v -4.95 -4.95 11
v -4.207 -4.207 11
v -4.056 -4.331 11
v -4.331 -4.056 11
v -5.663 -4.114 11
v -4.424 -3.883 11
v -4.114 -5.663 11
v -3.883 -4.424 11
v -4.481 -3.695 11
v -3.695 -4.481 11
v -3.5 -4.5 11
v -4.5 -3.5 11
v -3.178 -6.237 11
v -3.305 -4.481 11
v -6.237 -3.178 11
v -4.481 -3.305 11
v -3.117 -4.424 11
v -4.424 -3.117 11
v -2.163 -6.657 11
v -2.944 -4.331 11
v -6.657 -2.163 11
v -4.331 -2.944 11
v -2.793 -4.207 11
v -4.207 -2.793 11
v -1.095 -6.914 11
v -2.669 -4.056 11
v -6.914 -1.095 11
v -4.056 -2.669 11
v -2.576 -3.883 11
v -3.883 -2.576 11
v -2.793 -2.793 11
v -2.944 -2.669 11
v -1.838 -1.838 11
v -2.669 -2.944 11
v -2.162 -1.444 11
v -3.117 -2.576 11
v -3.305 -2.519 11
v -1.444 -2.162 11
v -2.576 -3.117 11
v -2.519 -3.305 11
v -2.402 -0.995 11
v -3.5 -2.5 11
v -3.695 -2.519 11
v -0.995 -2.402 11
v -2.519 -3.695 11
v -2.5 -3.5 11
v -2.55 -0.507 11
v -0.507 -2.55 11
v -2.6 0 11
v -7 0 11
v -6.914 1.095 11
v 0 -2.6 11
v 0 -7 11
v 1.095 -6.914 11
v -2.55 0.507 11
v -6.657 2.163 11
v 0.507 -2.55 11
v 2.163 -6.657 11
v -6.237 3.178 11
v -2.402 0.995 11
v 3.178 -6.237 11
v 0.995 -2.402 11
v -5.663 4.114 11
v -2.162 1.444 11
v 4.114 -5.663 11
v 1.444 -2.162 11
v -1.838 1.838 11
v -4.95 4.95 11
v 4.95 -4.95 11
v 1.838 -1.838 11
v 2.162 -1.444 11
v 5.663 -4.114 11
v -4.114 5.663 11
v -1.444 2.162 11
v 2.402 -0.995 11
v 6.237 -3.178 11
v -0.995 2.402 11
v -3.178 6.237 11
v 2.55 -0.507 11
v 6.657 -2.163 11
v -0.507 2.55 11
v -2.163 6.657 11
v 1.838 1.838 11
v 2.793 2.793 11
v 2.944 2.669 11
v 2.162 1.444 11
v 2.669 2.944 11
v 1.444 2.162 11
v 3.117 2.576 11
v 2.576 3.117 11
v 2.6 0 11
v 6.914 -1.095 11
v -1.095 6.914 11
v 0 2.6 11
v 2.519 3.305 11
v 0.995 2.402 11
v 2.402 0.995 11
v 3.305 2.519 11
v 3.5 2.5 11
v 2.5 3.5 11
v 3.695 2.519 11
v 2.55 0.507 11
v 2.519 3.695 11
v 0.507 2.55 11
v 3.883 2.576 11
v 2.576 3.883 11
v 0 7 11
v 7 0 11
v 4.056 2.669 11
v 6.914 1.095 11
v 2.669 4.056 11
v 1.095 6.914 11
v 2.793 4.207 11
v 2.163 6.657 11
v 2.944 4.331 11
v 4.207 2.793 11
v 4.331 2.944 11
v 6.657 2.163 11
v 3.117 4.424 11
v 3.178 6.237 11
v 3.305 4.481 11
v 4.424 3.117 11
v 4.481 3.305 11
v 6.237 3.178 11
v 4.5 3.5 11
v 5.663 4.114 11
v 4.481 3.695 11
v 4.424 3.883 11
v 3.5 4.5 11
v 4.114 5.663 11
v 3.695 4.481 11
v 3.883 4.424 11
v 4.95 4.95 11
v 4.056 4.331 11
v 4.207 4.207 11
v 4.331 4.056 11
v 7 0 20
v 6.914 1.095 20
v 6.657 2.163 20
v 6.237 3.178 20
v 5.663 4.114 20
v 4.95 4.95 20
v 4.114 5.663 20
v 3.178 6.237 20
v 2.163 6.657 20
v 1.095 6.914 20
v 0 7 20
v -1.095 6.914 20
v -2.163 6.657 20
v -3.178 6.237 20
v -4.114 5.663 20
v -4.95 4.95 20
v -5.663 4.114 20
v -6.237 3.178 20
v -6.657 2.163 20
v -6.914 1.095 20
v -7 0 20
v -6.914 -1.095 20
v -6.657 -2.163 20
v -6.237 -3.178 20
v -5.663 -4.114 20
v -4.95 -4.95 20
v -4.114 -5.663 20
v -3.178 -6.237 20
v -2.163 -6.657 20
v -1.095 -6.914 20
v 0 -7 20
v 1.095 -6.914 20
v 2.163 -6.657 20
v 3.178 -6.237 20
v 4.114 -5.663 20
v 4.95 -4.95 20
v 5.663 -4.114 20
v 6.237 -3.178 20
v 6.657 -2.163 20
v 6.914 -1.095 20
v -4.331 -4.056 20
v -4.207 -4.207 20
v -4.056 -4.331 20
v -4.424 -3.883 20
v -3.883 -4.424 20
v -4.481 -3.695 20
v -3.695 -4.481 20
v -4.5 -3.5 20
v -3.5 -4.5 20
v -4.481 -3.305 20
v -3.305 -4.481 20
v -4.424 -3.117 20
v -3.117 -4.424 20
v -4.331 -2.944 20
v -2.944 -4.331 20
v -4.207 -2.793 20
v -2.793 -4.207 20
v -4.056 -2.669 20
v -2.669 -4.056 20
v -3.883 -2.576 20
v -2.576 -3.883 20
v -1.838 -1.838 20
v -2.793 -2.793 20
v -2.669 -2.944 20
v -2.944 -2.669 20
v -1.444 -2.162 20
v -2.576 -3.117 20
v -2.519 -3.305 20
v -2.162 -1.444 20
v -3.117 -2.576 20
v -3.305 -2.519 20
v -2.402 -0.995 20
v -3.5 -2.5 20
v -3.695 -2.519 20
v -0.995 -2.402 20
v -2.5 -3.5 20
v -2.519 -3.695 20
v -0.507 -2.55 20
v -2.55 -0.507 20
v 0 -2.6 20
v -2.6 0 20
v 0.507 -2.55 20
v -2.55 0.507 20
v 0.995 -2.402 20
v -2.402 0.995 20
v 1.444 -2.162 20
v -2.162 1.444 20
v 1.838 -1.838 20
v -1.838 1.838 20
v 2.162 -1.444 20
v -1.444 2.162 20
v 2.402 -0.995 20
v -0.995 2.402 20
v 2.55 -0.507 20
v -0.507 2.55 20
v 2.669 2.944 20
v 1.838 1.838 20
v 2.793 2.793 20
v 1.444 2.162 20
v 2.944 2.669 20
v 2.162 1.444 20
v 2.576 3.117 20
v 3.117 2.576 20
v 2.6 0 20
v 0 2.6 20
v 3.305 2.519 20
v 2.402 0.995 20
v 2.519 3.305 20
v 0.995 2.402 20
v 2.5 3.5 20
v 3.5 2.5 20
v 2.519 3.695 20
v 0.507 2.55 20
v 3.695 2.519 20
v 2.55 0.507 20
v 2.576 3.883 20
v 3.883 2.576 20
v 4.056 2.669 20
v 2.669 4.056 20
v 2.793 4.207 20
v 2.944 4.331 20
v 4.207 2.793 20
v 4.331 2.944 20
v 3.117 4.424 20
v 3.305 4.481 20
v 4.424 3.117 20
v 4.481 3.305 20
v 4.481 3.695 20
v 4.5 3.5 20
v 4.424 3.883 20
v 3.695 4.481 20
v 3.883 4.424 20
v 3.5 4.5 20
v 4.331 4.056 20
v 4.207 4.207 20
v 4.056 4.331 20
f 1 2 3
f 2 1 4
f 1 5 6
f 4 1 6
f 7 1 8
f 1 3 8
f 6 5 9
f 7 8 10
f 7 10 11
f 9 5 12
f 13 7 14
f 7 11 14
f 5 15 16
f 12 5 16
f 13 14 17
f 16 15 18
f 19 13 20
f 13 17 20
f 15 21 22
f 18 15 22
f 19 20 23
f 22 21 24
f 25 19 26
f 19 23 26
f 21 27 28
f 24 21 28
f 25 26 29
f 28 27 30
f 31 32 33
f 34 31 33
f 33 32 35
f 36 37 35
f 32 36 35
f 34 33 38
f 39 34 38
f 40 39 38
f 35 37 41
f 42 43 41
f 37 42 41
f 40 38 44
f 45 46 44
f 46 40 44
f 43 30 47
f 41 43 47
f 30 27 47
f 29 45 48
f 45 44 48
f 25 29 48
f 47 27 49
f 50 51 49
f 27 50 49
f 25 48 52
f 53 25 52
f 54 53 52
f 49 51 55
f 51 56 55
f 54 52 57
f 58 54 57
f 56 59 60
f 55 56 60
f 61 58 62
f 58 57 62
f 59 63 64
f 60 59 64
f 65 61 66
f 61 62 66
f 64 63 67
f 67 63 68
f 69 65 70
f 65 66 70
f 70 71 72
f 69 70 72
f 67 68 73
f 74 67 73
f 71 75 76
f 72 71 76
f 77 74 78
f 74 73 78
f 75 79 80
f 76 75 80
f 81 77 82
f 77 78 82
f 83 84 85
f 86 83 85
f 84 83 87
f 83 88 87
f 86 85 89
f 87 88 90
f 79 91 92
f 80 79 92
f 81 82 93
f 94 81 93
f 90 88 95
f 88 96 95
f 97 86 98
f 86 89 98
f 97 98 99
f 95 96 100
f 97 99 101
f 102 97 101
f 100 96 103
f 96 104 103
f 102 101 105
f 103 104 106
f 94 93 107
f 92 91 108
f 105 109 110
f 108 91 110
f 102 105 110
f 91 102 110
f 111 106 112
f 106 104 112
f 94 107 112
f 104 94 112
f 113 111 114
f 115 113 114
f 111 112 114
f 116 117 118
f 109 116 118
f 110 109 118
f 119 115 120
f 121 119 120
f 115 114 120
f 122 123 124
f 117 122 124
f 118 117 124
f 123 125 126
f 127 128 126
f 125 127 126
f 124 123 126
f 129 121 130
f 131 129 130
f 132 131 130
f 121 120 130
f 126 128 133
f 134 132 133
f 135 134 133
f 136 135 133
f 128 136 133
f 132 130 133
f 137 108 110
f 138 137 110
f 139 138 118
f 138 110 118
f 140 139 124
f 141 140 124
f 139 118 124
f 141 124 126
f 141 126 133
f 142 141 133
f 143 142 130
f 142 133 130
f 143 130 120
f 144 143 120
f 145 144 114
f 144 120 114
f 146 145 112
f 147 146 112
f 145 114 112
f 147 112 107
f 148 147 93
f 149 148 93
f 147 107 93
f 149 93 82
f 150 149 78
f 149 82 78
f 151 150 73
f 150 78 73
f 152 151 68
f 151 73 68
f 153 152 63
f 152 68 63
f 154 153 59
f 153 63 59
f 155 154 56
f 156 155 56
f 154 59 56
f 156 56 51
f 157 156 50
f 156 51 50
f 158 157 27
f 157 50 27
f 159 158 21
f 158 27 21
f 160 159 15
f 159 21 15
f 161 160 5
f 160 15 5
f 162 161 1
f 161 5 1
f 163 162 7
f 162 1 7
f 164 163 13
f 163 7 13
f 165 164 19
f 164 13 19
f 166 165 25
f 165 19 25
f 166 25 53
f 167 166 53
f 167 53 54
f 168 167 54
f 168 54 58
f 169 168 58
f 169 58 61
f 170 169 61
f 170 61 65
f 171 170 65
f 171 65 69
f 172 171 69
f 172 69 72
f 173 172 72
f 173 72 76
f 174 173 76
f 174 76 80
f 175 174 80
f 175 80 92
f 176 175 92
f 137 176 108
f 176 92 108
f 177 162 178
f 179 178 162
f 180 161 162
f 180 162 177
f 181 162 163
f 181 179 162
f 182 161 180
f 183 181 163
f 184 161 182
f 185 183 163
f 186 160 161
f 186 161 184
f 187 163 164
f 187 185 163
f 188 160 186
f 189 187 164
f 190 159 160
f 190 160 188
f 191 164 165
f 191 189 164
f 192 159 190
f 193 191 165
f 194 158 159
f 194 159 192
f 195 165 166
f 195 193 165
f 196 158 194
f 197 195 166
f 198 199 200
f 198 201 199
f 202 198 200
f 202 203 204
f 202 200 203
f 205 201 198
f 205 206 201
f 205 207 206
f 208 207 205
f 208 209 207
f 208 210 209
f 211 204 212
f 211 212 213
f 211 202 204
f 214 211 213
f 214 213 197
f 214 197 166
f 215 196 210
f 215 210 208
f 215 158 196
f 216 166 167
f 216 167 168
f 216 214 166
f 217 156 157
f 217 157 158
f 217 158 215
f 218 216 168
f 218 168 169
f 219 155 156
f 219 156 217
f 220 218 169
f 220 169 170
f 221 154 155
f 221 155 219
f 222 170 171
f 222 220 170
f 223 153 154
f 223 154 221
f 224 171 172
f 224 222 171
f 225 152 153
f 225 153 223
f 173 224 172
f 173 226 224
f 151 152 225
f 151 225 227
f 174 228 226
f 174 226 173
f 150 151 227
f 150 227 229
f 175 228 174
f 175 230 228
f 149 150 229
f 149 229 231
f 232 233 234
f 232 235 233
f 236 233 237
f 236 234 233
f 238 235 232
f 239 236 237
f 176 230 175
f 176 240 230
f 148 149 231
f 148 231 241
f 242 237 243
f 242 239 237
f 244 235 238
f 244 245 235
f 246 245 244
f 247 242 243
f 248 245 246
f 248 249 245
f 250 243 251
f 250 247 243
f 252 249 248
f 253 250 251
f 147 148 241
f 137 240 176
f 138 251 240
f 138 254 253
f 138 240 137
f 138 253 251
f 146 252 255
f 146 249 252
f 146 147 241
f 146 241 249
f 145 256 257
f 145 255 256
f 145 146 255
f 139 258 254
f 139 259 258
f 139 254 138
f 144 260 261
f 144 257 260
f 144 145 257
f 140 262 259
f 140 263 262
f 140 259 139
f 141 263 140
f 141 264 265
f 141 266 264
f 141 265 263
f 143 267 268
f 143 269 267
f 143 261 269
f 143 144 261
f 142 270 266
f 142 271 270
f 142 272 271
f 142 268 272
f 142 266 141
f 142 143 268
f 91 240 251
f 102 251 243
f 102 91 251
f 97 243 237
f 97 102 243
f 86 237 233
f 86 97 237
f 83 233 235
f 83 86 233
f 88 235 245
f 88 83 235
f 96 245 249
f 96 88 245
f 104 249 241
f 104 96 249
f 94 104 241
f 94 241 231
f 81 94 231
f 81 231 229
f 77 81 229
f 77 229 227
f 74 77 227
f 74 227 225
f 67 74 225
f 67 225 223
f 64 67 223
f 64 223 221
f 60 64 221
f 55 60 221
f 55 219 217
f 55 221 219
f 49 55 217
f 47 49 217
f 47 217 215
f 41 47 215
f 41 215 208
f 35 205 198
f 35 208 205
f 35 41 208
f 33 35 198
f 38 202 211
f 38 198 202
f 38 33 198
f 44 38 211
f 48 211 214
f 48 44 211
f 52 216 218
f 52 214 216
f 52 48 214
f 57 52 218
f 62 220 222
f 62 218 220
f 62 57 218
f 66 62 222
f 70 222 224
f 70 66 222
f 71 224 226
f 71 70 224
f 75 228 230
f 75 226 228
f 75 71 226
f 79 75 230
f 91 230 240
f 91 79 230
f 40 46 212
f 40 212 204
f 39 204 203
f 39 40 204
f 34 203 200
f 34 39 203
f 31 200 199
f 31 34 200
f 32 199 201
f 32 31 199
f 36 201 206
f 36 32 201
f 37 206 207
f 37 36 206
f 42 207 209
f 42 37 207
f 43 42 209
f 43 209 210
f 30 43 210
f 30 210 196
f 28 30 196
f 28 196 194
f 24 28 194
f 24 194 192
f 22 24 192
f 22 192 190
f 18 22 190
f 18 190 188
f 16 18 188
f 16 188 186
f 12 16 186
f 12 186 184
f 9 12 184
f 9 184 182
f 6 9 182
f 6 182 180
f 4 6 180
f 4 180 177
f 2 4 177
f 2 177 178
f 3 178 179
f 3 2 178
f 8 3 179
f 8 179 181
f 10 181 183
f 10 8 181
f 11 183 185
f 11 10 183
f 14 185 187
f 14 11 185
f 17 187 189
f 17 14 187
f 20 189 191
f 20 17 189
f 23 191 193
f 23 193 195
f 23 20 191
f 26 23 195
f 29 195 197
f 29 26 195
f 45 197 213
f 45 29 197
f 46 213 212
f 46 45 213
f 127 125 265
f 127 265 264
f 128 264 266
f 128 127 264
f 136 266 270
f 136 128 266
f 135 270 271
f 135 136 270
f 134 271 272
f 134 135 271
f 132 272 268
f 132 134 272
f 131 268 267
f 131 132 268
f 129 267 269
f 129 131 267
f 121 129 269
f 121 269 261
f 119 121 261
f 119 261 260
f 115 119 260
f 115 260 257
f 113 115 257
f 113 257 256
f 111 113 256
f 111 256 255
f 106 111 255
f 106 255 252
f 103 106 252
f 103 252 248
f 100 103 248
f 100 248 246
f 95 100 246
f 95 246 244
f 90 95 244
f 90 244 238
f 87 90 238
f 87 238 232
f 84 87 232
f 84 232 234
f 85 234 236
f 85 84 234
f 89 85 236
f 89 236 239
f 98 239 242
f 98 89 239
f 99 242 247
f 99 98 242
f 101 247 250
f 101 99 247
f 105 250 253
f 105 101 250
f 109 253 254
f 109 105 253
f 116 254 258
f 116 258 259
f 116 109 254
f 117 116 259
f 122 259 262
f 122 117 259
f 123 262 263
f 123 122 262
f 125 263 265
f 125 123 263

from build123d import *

# Parameters (mm, degrees)
CYLINDER1283_R     = 1
CYLINDER1283_DEPTH = 20
CYLINDER1280_R     = 1
CYLINDER1280_DEPTH = 20
CYLINDER1279_R     = 2.6
CYLINDER1279_DEPTH = 12
CYLINDER1293_R     = 7
CYLINDER1293_DEPTH = 9


with BuildPart() as v_lec1283:
    # Cylinder1283 → Cylinder1283 (new body)
    with BuildSketch(Plane(origin=(-3.5, -3.5, 0), x_dir=(1, 0, 0), z_dir=(0, 0, 1))):
        Circle(CYLINDER1283_R)
    extrude(amount=CYLINDER1283_DEPTH)


with BuildPart() as compound693:
    # Cylinder1280 → Cylinder1280 (new body)
    with BuildSketch(Plane(origin=(3.5, 3.5, 0), x_dir=(1, 0, 0), z_dir=(0, 0, 1))):
        Circle(CYLINDER1280_R)
    extrude(amount=CYLINDER1280_DEPTH)

    # Compound693: union Válec1283
    add(v_lec1283.part)


with BuildPart() as v_lec1279:
    # Cylinder1279 → Cylinder1279 (new body)
    with BuildSketch(Plane.XY.offset(13)):
        Circle(CYLINDER1279_R)
    extrude(amount=CYLINDER1279_DEPTH)


with BuildPart() as cut484:
    # Cylinder1293 → Cylinder1293 (new body)
    with BuildSketch(Plane.XY.offset(13)):
        Circle(CYLINDER1293_R)
    extrude(amount=CYLINDER1293_DEPTH)

    # Cut490: cut Válec1279
    add(v_lec1279.part, mode=Mode.SUBTRACT)


with BuildPart() as cut484_1:
    # Cut490 placement: moved
    add(cut484.part.moved(Location((0, 0, -2))))

    # Cut484: cut Compound693
    add(compound693.part, mode=Mode.SUBTRACT)


solid = cut484_1.part
